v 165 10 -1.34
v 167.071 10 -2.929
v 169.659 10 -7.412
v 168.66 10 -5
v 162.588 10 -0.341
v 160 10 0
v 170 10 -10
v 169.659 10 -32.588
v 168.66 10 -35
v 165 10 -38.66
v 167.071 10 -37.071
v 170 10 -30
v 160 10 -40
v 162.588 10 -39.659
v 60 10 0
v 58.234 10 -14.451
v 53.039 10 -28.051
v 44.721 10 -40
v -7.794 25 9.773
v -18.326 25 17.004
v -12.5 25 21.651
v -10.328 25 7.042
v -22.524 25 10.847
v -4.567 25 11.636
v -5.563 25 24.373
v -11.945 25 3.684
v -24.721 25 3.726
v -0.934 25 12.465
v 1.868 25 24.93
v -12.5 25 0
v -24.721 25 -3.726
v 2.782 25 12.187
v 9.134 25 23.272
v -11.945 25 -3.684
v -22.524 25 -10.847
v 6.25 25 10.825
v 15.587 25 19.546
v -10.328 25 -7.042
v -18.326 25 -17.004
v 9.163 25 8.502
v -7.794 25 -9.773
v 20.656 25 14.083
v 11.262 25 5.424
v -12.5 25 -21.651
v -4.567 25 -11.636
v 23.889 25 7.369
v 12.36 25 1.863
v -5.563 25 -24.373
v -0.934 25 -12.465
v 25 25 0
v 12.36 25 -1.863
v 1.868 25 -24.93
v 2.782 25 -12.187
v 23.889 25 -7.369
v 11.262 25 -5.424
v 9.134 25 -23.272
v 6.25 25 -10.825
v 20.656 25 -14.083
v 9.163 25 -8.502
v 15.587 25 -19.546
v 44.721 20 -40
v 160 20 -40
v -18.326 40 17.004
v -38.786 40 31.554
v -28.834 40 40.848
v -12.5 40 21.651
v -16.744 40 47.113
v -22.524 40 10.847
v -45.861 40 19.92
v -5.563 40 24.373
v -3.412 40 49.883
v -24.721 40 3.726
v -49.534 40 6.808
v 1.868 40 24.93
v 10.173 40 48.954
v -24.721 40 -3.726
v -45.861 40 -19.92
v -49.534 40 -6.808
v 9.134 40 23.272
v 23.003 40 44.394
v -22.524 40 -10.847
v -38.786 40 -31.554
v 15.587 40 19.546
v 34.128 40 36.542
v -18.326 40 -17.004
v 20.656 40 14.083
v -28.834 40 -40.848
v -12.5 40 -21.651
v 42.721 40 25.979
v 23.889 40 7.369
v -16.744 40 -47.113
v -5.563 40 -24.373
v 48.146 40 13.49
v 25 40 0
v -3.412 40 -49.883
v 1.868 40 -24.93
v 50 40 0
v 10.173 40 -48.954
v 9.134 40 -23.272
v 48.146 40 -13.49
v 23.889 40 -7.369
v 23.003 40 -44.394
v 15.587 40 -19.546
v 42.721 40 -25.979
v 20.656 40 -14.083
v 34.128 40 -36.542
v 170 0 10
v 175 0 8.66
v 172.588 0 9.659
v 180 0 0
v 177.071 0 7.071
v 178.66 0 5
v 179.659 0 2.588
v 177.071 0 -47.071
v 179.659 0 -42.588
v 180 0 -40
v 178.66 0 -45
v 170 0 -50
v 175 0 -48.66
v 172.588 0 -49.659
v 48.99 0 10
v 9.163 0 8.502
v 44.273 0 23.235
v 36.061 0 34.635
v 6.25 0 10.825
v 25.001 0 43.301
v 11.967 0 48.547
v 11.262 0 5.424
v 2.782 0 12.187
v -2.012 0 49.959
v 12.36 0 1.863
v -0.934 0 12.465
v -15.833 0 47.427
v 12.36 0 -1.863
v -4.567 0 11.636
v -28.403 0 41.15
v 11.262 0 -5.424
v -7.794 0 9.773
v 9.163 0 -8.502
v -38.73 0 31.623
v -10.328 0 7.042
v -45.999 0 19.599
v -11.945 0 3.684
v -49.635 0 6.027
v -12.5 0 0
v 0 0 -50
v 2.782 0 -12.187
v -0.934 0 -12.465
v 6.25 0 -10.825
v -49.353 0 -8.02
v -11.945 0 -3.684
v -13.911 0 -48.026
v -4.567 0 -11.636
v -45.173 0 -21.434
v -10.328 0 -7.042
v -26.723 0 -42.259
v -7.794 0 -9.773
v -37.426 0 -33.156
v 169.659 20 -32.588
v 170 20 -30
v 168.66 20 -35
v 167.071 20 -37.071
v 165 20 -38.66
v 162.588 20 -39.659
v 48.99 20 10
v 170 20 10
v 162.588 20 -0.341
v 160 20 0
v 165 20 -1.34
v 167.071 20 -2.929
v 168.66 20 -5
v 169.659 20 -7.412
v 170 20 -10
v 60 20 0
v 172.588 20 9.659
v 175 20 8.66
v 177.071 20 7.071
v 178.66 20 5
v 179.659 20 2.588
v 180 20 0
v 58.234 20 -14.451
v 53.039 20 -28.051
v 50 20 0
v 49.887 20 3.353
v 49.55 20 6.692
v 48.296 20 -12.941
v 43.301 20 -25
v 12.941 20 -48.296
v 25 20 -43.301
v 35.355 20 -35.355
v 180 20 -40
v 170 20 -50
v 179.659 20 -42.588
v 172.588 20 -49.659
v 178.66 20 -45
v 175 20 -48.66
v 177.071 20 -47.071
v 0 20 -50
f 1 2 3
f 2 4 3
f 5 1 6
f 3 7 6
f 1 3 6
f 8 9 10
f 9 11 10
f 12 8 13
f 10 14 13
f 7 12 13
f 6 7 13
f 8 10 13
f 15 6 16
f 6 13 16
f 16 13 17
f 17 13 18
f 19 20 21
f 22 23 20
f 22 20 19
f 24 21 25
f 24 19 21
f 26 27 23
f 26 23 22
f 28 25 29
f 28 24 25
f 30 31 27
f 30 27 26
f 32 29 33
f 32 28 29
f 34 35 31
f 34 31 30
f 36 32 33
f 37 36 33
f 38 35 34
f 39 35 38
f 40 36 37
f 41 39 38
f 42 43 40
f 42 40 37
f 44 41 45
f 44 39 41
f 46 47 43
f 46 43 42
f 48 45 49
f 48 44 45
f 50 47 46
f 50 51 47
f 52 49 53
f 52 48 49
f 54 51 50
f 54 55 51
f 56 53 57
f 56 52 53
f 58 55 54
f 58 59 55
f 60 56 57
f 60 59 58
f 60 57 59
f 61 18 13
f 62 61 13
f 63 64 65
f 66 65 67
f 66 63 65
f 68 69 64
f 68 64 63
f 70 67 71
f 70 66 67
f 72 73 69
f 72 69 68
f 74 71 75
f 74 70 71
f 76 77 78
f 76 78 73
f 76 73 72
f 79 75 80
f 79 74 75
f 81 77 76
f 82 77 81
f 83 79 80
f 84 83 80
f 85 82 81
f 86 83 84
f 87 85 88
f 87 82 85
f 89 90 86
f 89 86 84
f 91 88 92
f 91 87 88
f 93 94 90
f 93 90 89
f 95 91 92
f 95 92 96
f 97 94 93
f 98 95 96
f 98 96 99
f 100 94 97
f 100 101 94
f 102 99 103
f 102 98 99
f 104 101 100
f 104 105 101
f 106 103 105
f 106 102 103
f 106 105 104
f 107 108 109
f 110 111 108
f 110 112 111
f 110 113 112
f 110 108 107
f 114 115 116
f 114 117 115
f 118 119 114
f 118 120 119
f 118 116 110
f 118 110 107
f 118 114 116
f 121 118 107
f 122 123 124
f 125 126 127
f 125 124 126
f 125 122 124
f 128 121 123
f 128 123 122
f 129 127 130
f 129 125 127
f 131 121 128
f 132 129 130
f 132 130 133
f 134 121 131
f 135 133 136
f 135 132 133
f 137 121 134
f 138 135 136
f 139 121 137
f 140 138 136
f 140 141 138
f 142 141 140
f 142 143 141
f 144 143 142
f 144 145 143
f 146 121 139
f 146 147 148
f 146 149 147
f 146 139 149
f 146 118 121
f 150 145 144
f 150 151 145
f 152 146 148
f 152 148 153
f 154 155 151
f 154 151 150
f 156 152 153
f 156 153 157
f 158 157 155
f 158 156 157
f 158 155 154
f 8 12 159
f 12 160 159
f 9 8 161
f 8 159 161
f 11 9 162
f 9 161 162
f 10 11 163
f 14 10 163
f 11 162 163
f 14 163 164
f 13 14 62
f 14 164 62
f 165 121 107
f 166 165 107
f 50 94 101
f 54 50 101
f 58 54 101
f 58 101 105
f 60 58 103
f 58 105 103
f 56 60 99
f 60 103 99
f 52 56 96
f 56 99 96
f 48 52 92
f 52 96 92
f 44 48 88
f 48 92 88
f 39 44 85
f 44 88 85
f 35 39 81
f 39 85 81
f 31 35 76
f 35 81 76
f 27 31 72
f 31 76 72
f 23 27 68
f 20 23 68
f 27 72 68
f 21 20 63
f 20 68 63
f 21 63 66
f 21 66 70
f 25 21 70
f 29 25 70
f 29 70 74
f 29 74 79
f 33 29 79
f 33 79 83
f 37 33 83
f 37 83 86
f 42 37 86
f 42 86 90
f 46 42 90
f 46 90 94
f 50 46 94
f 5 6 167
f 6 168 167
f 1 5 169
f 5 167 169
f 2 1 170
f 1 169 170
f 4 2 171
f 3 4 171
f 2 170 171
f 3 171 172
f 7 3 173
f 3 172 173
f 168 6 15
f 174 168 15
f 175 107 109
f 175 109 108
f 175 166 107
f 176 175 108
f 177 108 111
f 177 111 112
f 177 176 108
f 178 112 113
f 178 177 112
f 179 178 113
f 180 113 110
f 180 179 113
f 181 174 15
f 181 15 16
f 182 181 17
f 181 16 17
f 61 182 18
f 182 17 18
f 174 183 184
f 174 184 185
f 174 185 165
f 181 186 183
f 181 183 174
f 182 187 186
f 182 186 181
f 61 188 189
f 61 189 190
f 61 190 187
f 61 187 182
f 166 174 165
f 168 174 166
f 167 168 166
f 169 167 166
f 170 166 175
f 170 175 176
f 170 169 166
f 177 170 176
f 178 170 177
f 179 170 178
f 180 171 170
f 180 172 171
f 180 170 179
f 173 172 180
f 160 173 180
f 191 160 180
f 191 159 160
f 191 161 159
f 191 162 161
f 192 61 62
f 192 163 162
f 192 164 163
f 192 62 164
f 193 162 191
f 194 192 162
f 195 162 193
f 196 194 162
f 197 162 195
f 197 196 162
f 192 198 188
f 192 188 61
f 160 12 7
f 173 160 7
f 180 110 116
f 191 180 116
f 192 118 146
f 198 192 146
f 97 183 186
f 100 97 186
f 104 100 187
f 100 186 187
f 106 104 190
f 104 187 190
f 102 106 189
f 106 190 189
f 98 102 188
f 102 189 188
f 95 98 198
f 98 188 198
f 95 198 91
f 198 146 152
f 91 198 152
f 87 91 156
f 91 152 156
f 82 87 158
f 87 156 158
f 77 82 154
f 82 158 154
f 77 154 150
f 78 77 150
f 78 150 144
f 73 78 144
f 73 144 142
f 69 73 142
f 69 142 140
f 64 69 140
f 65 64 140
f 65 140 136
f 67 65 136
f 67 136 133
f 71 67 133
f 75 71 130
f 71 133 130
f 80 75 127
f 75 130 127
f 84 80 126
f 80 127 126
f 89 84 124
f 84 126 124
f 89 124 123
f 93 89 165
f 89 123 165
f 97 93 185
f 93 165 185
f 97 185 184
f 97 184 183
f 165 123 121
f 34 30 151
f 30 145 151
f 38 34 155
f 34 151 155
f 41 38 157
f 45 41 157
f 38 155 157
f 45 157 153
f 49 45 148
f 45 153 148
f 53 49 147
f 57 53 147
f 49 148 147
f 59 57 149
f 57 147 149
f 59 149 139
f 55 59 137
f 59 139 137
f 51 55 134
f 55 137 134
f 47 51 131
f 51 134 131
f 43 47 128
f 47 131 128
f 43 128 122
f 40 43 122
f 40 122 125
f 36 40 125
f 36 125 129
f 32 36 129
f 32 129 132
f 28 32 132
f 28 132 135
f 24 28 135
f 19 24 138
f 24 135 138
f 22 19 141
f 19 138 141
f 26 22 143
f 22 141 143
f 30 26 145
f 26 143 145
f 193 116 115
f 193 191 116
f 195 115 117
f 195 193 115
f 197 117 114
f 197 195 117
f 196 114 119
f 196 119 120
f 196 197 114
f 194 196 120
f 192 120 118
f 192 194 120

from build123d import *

# Parameters (mm, degrees)
EXTRUDE_1_DEPTH                = 20
EXTRUDE_2_DEPTH                = 40
EXTRUDE_3_DEPTH                = 10
FILLET_1_R                     = 10
HOLE_WIZARD_M1_6_1_D           = 25
HOLE_WIZARD_M1_6_1_CBORE_D     = 50
HOLE_WIZARD_M1_6_1_CBORE_DEPTH = 15


with BuildPart() as part:
    # 스케치2 → 보스-돌출1 (new body)
    with BuildSketch(Plane(origin=(0, 0, 0), x_dir=(1, 0, 0), z_dir=(0, 1, 0))):
        with BuildLine():
            Line((180, 50), (0, 50))
            ThreePointArc((0, 50), (35.355339059, 35.355339059), (50, 0))
            ThreePointArc((50, 0), (49.74680765, -5.0254481), (48.989794856, -10))
            Line((48.989794856, -10), (180, -10))
            Line((180, -10), (180, 50))
        make_face()
        with BuildLine():
            ThreePointArc((60, 0), (56.050341538, 21.409325386), (44.72135955, 40))
            Line((44.72135955, 40), (170, 40))
            Line((170, 40), (170, 0))
            Line((170, 0), (60, 0))
        make_face(mode=Mode.SUBTRACT)
    extrude(amount=EXTRUDE_1_DEPTH)

    # 스케치2<4> → 보스-돌출2 (add)
    with BuildSketch(Plane(origin=(0, 0, 0), x_dir=(1, 0, 0), z_dir=(0, 1, 0))):
        with BuildLine():
            ThreePointArc((50, 0), (35.355339059, 35.355339059), (0, 50))
            ThreePointArc((0, 50), (-38.729833462, -31.622776602), (48.989794856, -10))
            ThreePointArc((48.989794856, -10), (49.74680765, -5.0254481), (50, 0))
        make_face()
    extrude(amount=EXTRUDE_2_DEPTH)

    # 스케치2<5> → 보스-돌출3 (add)
    with BuildSketch(Plane(origin=(0, 0, 0), x_dir=(1, 0, 0), z_dir=(0, 1, 0))):
        with BuildLine():
            Line((44.72135955, 40), (170, 40))
            Line((170, 40), (170, 0))
            Line((170, 0), (60, 0))
            ThreePointArc((60, 0), (56.050341538, 21.409325386), (44.72135955, 40))
        make_face()
    extrude(amount=EXTRUDE_3_DEPTH)

    # 필렛1
    fillet_1_edges = [part.edges().sort_by_distance(p)[0] for p in [
        (180, 10, -50),
        (170, 15, -40),
        (170, 15, 0),
        (180, 10, 10),
    ]]
    fillet(fillet_1_edges, radius=FILLET_1_R)

    # M1.6 남비 머리 나사용 카운터보어1 (through all)
    with Locations(Plane(origin=(0, 40, 0), x_dir=(1, 0, 0), z_dir=(0, 1, 0))):
        with Locations((0, 0)):
            CounterBoreHole(HOLE_WIZARD_M1_6_1_D / 2, HOLE_WIZARD_M1_6_1_CBORE_D / 2, HOLE_WIZARD_M1_6_1_CBORE_DEPTH)


solid = part.part
